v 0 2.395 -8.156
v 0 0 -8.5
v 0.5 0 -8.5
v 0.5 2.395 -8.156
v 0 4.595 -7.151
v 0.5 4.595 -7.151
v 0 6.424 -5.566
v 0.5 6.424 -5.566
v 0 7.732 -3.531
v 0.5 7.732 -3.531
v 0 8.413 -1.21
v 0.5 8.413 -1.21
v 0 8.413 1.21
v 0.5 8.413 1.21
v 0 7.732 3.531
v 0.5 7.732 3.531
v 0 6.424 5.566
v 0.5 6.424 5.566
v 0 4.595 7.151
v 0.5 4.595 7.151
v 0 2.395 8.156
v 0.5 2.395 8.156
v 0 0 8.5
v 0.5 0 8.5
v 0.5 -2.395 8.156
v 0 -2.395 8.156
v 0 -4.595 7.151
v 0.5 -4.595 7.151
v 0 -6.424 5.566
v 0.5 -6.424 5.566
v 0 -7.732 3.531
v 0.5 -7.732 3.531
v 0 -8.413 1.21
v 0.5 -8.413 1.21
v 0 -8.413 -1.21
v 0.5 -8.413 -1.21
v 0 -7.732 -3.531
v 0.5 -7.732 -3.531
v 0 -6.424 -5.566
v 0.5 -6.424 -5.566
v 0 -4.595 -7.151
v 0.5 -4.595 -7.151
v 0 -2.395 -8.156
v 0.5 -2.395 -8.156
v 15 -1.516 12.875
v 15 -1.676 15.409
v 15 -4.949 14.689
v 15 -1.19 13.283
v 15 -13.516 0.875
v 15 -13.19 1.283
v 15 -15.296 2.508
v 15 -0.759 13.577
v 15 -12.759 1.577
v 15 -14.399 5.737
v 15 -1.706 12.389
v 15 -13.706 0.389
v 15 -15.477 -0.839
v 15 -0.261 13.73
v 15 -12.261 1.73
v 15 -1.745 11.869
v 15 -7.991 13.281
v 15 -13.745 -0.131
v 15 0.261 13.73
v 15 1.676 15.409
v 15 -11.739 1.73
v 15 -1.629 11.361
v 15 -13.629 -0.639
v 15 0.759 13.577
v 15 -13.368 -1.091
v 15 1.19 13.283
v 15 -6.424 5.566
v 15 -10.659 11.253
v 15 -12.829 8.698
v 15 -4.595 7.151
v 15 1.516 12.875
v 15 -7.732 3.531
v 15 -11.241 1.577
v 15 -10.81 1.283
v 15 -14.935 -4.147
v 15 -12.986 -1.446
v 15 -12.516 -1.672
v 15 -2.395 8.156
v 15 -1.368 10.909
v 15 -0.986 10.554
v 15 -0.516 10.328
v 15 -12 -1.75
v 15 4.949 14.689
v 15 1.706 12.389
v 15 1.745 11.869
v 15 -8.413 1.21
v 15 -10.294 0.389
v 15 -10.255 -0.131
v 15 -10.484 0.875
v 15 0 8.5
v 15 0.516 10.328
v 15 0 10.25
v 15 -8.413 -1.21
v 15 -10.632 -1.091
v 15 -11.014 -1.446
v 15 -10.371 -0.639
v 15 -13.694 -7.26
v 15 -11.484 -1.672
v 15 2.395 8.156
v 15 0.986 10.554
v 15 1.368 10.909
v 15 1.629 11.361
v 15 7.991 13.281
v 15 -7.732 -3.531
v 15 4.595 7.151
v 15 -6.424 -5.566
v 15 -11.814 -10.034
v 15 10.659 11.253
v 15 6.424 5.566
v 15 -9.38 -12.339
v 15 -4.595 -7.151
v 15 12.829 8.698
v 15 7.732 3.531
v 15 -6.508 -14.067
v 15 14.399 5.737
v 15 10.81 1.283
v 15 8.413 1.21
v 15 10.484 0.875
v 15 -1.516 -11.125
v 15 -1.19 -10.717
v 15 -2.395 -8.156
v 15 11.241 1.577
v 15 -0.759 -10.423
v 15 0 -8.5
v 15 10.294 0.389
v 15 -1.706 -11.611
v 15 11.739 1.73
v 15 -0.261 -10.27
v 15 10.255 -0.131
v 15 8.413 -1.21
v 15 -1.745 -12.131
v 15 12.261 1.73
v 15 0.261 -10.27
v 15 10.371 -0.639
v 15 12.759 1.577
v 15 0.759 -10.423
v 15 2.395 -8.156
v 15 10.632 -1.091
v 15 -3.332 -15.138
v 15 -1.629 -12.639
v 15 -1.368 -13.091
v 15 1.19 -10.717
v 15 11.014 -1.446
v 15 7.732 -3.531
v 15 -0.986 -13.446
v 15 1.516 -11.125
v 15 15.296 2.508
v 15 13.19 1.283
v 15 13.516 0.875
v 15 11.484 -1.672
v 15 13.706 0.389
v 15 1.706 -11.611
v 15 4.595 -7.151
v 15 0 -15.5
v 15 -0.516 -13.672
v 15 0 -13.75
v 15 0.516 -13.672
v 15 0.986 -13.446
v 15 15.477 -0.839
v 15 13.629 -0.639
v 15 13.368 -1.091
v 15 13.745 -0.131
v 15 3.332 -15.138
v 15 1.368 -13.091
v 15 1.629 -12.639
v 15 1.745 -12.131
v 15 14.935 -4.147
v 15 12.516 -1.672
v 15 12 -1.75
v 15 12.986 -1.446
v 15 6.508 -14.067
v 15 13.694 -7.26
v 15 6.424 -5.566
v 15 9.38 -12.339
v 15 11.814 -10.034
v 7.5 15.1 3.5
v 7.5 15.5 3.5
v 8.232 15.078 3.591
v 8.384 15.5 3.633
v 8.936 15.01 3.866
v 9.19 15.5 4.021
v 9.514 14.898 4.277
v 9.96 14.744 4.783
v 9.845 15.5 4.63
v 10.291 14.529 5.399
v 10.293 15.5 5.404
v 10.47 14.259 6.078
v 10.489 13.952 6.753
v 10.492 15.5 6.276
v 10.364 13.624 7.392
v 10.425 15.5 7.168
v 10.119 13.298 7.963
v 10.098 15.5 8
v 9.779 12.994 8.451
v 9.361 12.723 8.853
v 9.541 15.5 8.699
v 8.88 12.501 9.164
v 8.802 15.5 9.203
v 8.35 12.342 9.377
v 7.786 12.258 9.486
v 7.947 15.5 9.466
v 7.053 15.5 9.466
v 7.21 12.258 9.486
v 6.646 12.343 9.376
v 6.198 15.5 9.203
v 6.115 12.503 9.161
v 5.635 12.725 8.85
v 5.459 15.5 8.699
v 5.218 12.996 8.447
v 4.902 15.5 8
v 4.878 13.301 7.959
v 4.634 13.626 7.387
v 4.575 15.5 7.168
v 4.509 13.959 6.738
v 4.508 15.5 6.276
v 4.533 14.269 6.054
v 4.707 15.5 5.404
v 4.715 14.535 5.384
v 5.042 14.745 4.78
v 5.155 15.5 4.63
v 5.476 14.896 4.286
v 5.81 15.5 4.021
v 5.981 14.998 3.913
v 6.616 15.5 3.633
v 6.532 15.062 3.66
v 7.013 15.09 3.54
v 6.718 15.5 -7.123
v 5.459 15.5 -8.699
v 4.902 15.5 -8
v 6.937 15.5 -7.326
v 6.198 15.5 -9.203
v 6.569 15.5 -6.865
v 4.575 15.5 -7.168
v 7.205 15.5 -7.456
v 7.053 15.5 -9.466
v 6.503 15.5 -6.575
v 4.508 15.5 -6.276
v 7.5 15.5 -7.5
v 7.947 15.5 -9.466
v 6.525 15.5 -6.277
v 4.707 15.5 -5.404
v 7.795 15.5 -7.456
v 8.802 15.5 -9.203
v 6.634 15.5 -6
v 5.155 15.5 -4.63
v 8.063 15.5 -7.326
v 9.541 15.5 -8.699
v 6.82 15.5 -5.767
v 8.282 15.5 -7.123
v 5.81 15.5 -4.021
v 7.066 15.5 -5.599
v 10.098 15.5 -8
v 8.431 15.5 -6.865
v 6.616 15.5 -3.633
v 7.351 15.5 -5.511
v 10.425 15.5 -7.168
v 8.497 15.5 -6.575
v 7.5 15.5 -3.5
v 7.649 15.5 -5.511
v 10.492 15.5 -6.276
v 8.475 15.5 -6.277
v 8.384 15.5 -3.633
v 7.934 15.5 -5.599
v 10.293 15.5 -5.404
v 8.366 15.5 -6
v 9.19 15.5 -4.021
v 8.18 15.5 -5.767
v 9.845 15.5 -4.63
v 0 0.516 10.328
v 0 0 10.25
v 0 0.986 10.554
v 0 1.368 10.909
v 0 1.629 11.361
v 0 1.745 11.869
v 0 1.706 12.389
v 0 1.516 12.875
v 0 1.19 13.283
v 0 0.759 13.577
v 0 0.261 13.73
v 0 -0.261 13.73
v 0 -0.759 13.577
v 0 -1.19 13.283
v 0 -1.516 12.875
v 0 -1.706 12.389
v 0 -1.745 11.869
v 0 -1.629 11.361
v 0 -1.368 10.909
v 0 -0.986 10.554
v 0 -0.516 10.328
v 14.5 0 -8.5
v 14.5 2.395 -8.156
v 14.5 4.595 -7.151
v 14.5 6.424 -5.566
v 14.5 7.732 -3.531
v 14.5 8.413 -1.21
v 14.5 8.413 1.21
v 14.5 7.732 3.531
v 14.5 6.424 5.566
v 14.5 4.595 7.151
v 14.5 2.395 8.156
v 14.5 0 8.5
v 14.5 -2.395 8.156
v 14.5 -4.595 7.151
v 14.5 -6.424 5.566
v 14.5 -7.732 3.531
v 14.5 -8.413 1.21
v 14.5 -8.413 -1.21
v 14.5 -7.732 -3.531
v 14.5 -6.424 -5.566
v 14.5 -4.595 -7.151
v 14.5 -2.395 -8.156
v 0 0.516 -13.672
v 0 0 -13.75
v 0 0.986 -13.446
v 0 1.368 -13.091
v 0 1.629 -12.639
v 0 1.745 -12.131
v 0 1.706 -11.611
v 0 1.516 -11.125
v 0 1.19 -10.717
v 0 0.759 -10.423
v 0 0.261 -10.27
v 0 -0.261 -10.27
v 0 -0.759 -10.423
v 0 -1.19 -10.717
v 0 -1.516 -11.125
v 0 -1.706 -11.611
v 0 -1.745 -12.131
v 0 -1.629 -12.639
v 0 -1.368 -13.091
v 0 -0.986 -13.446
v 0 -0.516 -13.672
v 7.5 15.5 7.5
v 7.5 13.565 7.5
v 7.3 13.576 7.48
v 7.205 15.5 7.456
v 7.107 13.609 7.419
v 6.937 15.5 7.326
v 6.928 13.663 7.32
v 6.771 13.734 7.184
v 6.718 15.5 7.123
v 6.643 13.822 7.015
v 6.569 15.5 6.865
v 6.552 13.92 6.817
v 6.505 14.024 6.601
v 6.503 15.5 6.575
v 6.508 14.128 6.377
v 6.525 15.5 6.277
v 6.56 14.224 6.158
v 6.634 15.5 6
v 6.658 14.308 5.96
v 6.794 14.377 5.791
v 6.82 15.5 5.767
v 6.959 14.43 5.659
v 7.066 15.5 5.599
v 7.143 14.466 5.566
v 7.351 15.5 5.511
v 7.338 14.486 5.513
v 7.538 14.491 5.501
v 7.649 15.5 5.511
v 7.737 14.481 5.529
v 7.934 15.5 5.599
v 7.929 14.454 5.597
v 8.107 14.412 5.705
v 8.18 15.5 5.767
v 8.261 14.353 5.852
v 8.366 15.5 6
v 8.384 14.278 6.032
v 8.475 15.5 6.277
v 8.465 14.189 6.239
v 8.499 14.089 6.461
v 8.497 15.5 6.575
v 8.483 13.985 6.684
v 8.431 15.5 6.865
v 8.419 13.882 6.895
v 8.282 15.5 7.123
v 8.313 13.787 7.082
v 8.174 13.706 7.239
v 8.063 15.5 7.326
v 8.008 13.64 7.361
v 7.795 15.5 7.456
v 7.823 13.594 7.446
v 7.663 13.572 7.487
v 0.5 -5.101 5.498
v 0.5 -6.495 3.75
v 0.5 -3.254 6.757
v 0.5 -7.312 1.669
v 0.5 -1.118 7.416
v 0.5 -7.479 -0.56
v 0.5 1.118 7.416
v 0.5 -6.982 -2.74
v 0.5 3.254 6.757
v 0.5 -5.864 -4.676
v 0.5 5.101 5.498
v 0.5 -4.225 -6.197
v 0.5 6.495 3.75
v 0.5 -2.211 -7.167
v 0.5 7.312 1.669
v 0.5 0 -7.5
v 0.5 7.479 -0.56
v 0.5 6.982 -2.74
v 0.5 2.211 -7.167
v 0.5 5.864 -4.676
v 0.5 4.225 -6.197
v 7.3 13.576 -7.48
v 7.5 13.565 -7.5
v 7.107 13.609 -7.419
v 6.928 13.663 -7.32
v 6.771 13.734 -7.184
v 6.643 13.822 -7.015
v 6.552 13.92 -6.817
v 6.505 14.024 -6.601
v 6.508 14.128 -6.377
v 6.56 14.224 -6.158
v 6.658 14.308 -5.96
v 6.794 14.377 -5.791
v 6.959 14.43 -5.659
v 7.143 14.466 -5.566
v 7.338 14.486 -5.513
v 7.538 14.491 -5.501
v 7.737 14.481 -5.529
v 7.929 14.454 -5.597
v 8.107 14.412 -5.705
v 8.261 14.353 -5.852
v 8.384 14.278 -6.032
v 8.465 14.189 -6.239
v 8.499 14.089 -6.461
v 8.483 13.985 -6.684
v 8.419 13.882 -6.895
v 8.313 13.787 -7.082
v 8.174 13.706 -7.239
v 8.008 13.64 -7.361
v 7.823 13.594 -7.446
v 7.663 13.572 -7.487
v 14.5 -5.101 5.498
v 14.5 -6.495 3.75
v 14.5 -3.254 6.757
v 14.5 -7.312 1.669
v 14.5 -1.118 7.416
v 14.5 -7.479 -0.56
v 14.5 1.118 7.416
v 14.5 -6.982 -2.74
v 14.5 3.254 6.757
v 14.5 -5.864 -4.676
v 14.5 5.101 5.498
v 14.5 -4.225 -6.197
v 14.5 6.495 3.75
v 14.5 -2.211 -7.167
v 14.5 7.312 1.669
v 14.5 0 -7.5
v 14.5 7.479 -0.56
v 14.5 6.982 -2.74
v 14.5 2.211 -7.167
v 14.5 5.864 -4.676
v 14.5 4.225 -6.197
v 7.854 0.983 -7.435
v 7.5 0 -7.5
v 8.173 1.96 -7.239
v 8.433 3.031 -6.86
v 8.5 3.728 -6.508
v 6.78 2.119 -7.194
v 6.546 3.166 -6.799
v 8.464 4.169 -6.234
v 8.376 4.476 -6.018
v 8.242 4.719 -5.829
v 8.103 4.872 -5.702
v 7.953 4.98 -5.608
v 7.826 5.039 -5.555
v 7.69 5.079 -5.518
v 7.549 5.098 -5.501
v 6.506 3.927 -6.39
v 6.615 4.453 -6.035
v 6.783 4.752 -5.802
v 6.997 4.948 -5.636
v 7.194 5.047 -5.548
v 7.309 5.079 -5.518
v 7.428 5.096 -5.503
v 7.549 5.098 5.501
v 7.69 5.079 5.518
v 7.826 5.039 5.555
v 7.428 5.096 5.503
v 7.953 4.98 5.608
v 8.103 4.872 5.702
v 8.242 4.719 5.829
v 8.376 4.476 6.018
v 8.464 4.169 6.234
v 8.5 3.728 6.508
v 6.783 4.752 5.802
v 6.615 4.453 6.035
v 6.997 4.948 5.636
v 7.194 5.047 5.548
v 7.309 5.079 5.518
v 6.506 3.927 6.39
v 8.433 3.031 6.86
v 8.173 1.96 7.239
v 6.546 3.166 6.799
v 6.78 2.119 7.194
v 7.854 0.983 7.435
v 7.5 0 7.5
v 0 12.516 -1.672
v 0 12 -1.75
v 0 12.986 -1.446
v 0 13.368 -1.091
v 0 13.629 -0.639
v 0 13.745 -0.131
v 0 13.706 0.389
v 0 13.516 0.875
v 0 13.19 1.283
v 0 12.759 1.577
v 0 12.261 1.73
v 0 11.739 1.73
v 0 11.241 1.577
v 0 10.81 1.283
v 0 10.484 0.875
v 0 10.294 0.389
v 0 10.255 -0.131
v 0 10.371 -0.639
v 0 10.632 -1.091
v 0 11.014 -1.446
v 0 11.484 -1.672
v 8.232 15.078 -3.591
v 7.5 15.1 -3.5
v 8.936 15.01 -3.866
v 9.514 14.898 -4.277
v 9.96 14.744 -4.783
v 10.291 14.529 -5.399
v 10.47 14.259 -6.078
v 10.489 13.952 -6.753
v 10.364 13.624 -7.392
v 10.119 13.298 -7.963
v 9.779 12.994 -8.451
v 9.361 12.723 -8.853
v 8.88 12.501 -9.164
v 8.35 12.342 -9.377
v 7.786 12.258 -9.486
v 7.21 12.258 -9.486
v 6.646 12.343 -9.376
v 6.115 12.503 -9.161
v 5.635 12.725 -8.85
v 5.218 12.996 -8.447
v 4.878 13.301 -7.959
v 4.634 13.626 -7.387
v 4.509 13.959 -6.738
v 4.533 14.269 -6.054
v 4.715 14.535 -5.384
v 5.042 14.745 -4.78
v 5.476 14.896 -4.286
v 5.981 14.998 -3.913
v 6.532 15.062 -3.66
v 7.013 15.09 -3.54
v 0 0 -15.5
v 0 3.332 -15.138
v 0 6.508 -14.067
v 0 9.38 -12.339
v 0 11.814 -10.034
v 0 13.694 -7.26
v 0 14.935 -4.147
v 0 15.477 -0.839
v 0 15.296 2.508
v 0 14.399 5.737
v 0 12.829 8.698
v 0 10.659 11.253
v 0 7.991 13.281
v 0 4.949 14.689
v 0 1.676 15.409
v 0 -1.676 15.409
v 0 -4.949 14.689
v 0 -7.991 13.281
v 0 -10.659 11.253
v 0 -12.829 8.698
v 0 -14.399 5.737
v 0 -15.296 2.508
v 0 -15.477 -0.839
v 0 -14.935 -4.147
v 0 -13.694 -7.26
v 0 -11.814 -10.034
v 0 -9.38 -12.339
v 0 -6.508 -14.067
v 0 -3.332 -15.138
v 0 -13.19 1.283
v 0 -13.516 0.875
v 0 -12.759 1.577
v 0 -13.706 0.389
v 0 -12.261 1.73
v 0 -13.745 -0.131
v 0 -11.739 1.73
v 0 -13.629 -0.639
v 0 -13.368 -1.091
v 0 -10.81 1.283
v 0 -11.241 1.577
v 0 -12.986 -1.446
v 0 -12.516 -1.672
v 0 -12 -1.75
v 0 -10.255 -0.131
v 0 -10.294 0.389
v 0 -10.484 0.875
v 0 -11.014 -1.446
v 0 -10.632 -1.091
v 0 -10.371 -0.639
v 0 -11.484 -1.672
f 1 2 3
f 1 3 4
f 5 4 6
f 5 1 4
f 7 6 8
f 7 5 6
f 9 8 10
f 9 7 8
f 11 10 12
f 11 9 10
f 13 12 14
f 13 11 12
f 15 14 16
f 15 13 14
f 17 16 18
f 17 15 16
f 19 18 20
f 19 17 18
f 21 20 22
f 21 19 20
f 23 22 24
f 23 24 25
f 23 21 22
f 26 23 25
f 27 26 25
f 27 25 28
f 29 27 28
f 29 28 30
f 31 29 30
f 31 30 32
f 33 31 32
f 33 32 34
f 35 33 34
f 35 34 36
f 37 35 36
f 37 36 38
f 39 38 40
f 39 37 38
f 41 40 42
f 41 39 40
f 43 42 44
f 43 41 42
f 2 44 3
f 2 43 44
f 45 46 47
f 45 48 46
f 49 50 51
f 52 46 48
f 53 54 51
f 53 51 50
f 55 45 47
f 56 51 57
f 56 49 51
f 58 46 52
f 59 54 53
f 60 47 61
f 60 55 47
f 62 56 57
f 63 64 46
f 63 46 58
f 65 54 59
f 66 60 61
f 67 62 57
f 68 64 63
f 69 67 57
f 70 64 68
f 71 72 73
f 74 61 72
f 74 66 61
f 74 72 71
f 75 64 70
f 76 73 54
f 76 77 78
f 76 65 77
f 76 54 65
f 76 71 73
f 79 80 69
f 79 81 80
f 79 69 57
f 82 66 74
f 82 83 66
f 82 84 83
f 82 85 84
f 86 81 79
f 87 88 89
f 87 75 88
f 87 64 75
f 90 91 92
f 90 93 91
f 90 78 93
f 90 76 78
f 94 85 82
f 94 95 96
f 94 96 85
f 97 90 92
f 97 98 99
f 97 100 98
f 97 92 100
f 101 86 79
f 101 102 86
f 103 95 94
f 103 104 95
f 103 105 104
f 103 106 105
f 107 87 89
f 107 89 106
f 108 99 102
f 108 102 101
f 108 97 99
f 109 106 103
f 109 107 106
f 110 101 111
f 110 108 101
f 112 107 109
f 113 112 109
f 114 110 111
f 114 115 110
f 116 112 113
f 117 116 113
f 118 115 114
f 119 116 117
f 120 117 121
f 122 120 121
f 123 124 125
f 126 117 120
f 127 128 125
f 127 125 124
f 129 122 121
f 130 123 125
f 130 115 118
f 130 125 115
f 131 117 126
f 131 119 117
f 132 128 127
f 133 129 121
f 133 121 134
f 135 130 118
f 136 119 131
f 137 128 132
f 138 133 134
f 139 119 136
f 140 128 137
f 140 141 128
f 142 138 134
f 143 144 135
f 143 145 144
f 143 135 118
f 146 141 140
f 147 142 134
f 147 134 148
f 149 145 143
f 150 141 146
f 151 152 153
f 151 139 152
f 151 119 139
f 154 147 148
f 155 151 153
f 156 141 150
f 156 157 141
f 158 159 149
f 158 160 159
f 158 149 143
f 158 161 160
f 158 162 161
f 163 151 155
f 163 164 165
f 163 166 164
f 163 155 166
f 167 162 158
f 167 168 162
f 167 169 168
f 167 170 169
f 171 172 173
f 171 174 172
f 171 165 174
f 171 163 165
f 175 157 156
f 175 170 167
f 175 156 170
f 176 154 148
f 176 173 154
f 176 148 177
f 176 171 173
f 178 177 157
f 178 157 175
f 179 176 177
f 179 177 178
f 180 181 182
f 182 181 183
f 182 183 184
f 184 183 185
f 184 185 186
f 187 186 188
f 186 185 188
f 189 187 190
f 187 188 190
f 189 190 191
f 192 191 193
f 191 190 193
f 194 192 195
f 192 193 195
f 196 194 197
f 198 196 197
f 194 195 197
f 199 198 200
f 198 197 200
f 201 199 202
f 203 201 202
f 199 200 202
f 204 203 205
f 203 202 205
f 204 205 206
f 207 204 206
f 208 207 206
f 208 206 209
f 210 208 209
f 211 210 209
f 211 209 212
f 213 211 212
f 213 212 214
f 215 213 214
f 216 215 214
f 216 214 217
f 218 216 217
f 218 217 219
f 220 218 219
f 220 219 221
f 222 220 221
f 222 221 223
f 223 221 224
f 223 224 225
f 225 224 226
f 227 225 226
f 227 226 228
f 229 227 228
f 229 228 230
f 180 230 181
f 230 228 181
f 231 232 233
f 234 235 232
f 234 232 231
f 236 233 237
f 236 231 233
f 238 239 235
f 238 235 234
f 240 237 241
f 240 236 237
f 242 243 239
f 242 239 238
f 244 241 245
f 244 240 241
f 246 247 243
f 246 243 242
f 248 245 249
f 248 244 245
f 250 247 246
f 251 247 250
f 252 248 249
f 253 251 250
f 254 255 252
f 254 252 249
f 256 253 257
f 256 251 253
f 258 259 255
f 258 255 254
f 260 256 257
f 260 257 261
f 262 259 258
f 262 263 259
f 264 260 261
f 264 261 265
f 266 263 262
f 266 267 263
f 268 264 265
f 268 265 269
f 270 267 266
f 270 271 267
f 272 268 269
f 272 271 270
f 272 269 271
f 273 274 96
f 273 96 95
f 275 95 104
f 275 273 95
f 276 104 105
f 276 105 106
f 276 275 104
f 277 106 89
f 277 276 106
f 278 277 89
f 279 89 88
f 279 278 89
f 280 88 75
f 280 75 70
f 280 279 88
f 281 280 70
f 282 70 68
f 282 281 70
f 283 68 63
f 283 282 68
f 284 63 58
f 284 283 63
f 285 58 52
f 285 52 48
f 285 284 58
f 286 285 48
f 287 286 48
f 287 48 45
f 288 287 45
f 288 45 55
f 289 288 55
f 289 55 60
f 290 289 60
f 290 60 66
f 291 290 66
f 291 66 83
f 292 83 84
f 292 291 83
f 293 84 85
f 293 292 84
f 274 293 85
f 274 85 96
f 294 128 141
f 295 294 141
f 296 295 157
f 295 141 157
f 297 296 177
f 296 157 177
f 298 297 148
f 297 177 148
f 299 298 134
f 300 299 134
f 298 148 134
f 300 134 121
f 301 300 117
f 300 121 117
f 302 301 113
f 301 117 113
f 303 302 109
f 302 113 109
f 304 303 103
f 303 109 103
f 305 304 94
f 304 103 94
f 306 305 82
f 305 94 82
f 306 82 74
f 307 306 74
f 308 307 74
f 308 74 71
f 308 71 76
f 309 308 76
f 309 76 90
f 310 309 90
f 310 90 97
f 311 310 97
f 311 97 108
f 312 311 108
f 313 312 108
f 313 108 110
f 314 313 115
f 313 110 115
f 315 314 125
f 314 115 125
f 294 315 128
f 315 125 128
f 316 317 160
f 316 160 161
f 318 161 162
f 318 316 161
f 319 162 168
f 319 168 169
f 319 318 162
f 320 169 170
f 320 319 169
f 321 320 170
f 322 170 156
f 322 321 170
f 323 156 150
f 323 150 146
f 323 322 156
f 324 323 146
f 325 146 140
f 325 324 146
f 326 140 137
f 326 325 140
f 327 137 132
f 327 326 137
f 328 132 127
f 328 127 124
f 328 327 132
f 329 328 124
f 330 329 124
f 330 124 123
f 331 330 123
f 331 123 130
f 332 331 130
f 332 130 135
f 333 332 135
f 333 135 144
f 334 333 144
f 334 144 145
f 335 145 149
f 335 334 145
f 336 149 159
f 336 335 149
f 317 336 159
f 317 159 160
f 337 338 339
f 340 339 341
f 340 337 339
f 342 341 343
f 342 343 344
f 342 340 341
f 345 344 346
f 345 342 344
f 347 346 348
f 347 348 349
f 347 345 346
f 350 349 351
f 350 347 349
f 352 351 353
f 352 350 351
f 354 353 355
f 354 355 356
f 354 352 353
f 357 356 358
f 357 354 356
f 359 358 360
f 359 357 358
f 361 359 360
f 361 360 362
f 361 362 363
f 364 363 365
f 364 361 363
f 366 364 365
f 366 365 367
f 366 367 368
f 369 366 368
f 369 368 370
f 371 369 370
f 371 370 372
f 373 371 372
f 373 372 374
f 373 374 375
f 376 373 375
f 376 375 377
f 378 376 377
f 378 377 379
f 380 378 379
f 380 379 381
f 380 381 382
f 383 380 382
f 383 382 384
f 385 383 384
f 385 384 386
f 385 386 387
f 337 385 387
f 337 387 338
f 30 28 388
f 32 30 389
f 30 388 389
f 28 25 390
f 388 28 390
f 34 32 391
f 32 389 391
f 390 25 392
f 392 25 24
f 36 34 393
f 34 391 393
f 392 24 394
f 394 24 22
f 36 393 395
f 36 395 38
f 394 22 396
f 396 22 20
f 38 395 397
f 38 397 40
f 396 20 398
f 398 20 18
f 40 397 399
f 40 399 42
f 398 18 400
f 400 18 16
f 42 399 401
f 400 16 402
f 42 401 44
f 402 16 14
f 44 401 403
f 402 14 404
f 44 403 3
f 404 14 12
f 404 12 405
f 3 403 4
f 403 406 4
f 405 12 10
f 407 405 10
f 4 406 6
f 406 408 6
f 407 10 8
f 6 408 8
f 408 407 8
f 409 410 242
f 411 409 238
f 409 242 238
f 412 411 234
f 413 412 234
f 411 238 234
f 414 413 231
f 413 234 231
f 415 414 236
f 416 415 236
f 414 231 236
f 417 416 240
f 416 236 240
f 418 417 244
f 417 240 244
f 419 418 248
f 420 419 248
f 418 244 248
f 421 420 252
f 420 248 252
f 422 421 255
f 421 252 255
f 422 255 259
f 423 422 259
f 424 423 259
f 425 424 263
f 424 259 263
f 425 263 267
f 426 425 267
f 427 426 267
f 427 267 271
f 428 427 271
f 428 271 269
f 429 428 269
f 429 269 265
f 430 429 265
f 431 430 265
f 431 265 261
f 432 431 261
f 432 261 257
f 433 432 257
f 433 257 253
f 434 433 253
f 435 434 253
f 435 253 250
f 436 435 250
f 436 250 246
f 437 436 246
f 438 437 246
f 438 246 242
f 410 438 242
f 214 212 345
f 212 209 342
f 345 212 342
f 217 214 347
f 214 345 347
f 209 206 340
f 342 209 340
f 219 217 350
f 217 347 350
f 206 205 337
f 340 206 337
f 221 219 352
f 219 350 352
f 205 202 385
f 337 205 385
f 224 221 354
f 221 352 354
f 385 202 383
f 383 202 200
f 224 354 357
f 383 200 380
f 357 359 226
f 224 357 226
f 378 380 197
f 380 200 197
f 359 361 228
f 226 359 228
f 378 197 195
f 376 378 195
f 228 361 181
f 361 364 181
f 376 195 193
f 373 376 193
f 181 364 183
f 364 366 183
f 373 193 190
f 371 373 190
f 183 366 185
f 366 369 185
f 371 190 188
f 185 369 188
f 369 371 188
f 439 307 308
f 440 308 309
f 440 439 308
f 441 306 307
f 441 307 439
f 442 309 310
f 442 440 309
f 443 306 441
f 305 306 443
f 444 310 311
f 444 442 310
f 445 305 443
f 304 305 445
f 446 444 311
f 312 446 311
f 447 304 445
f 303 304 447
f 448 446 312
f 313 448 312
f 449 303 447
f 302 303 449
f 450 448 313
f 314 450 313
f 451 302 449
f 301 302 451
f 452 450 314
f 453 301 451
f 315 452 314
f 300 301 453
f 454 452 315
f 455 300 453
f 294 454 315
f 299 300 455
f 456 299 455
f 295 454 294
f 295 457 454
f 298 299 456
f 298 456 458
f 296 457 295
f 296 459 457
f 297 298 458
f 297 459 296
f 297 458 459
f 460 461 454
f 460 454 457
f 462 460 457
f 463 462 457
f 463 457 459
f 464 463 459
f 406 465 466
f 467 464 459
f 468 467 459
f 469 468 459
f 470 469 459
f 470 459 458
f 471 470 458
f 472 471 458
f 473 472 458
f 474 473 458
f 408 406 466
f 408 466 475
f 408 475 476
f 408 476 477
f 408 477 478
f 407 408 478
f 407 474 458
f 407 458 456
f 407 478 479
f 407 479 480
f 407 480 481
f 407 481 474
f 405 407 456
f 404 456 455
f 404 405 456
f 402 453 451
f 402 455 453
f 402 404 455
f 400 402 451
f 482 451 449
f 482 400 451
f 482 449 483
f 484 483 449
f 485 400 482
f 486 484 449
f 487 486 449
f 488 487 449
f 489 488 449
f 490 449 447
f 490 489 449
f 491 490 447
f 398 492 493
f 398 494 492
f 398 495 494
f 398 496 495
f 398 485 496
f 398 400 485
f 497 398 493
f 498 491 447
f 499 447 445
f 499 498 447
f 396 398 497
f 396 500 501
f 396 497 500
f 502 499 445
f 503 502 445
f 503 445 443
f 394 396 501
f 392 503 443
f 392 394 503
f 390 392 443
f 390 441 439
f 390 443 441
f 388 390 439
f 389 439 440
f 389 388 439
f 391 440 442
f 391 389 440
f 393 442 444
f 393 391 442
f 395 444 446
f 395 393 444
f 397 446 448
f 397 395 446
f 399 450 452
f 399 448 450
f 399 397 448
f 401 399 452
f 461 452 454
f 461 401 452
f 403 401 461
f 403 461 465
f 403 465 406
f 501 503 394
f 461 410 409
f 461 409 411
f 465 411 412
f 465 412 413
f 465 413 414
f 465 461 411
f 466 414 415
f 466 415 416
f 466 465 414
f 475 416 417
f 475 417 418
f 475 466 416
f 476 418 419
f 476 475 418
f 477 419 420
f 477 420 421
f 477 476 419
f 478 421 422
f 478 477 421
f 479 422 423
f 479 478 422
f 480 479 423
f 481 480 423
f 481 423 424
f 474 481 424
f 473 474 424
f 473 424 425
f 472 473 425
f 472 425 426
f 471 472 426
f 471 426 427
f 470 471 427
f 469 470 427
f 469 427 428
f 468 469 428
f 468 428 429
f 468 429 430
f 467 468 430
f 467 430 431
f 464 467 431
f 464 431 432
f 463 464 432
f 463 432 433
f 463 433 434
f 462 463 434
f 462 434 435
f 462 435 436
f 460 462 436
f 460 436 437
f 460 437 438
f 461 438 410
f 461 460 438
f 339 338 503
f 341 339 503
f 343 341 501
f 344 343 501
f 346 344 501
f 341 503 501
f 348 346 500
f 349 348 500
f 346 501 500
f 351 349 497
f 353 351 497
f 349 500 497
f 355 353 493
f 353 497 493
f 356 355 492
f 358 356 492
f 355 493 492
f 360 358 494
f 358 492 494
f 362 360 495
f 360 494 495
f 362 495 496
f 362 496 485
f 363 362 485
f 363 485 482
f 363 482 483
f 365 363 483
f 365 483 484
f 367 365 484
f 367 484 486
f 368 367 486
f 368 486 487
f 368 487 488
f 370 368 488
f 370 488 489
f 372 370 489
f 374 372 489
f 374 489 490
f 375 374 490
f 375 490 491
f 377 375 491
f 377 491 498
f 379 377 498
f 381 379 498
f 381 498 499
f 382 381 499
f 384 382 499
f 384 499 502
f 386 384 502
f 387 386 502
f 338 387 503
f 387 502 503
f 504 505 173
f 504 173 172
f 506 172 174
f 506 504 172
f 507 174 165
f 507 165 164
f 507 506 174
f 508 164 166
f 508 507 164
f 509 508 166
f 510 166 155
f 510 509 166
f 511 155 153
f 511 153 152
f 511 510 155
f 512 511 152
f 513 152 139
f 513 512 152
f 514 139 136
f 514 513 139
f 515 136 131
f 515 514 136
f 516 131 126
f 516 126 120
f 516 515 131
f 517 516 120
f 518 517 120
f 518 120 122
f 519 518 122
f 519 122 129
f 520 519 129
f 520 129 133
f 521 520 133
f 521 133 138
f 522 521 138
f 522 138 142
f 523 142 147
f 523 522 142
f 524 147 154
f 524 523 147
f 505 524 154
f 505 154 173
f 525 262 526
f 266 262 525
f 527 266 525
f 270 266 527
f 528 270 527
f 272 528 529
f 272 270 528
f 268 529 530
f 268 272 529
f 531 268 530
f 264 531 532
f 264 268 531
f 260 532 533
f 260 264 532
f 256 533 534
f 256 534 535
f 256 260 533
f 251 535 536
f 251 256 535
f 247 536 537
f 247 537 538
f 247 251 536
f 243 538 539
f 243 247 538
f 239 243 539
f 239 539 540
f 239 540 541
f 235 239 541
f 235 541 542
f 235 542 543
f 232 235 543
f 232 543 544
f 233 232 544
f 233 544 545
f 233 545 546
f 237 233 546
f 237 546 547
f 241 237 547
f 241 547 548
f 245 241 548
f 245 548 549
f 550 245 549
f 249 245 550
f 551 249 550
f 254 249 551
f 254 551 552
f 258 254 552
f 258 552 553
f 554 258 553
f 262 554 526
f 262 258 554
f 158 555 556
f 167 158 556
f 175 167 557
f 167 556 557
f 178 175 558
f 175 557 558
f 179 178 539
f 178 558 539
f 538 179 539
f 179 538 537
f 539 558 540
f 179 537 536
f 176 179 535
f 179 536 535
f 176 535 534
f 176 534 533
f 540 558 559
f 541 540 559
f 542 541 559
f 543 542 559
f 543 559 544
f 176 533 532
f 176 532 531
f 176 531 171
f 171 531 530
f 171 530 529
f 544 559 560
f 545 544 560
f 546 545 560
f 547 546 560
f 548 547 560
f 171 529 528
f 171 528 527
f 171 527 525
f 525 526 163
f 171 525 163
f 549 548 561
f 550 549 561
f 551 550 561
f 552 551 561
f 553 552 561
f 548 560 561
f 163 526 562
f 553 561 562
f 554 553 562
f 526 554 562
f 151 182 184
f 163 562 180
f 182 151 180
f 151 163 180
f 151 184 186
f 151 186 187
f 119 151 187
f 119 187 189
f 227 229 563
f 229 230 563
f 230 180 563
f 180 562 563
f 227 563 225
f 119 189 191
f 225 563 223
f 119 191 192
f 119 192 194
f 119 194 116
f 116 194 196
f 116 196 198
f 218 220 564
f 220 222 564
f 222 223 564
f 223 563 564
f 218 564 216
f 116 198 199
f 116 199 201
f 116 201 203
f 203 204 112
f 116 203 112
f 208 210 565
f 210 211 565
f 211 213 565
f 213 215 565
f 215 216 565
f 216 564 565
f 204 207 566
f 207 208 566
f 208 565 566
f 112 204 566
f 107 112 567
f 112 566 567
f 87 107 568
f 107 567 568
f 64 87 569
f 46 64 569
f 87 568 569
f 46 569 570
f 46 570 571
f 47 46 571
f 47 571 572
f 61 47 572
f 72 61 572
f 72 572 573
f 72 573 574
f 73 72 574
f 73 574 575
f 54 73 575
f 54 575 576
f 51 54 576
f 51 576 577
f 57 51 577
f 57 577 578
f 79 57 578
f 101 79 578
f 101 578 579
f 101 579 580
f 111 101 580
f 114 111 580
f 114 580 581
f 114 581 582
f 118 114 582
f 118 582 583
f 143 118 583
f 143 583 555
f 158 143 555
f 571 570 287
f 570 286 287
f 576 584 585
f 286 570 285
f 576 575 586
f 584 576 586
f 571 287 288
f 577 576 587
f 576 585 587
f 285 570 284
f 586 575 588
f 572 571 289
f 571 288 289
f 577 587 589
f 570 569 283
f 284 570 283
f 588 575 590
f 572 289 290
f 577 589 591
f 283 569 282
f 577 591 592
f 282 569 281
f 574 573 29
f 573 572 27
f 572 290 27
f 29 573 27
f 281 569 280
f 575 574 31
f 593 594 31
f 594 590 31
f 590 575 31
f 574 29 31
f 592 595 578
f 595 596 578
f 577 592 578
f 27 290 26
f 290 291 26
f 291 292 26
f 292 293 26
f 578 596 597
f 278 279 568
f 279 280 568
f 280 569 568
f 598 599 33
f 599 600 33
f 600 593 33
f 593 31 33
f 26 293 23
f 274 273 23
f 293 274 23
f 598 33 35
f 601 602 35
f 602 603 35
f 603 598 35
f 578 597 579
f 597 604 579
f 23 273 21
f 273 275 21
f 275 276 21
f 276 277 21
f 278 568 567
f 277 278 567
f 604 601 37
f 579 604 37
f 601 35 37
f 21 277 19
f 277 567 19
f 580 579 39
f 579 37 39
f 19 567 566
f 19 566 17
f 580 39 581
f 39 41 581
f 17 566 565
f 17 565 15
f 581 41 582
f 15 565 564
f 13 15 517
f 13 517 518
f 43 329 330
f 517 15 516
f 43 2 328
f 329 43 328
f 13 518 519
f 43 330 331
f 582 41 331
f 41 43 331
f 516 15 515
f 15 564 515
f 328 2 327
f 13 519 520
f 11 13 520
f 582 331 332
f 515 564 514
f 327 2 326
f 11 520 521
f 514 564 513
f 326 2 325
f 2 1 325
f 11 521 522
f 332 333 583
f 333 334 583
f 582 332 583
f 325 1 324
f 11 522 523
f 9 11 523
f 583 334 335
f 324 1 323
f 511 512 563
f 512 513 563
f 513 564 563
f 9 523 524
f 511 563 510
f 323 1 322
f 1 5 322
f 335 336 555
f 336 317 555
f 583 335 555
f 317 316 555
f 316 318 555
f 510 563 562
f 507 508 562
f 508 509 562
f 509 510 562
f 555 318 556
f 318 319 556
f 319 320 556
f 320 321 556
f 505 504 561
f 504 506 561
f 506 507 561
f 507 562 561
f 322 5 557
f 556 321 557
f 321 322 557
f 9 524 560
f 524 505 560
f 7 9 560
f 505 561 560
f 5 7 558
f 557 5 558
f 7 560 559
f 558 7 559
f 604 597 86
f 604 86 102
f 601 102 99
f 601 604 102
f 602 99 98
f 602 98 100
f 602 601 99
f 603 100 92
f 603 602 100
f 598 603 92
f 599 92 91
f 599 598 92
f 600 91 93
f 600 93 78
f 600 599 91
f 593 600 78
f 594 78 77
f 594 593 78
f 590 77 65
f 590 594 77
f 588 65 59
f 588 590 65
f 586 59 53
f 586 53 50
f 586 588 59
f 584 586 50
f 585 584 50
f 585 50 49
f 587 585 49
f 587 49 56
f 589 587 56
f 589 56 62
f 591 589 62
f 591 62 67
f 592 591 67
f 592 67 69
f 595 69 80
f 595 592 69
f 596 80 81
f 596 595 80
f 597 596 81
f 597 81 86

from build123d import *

# Parameters (mm, degrees)
SKETCH2_R                = 15.5
SKETCH2_R_2              = 1.75
SKETCH2_R_3              = 7.5
FLANGE_DEPTH             = 15
SKETCH3_R                = 8.5
O_RING_SEAT_DEPTH        = 0.5
SKETCH5_R                = 1
OUTLET_DEPTH             = 27.561249971
BOSS_EXTRUDE2_REACH      = 39.766
BOSS_EXTRUDE2_END_RADIUS = 15.5
SKETCH6_R                = 3
SKETCH6_R_2              = 1


with BuildPart() as part:
    # Sketch2 → Flange (new body)
    with BuildSketch(Plane(origin=(0, 0, 0), x_dir=(0, 0, -1), z_dir=(1, 0, 0))):
        Circle(SKETCH2_R)
        with Locations((0, 12)):
            Circle(SKETCH2_R_2, mode=Mode.SUBTRACT)
        with Locations((12, 0)):
            Circle(SKETCH2_R_2, mode=Mode.SUBTRACT)
        with Locations((0, -12)):
            Circle(SKETCH2_R_2, mode=Mode.SUBTRACT)
        with Locations((-12, 0)):
            Circle(SKETCH2_R_2, mode=Mode.SUBTRACT)
        Circle(SKETCH2_R_3, mode=Mode.SUBTRACT)
    extrude(amount=FLANGE_DEPTH)

    # Sketch3 → O-Ring Seat (cut)
    with BuildSketch(Plane(origin=(15, 0, 0), x_dir=(0, 0, -1), z_dir=(1, 0, 0))):
        Circle(SKETCH3_R)
    o_ring_seat = extrude(amount=-O_RING_SEAT_DEPTH, mode=Mode.SUBTRACT)

    # Mirror1: O-Ring Seat across plane
    add(o_ring_seat.mirror(Plane.ZY.offset(-7.5)), mode=Mode.SUBTRACT)

    # Sketch5 → Outlet (cut, through all)
    with BuildSketch(Plane(origin=(0, 0, 0), x_dir=(1, 0, 0), z_dir=(0, 1, 0))):
        with Locations(Location((7.5, 6.5, 0), (0, 0, 90))):
            Circle(SKETCH5_R)
    outlet = extrude(amount=OUTLET_DEPTH, mode=Mode.SUBTRACT)

    # Boss-Extrude2: up to this cylinder (the profile starts outside it)
    boss_extrude2_end = Plane(origin=(7.5, 0, 0), z_dir=(-1, 0, 0)) * Cylinder(BOSS_EXTRUDE2_END_RADIUS, 111.532, mode=Mode.PRIVATE)
    # Sketch6 → Boss-Extrude2 (add, up to the surface)
    with BuildSketch(Plane(origin=(0, 15.5, 0), x_dir=(1, 0, 0), z_dir=(0, 1, 0)), mode=Mode.PRIVATE) as boss_extrude2_sk1:
        with Locations(Location((7.5, 6.5, 0), (0, 0, 270))):
            Circle(SKETCH6_R)
        with Locations(Location((7.5, 6.5, 0), (0, 0, 90))):
            Circle(SKETCH6_R_2, mode=Mode.SUBTRACT)
    boss_extrude2_tool1 = extrude(boss_extrude2_sk1.sketch, amount=-BOSS_EXTRUDE2_REACH, mode=Mode.PRIVATE) - boss_extrude2_end
    boss_extrude2 = boss_extrude2_tool1.solids().sort_by_distance((7.5, 15.5, -9.415147))[0]
    add(boss_extrude2)

    # Inlet: Outlet, Boss-Extrude2 across plane
    add(outlet.mirror(Plane.XY), mode=Mode.SUBTRACT)
    add(boss_extrude2.mirror(Plane.XY))


solid = part.part
